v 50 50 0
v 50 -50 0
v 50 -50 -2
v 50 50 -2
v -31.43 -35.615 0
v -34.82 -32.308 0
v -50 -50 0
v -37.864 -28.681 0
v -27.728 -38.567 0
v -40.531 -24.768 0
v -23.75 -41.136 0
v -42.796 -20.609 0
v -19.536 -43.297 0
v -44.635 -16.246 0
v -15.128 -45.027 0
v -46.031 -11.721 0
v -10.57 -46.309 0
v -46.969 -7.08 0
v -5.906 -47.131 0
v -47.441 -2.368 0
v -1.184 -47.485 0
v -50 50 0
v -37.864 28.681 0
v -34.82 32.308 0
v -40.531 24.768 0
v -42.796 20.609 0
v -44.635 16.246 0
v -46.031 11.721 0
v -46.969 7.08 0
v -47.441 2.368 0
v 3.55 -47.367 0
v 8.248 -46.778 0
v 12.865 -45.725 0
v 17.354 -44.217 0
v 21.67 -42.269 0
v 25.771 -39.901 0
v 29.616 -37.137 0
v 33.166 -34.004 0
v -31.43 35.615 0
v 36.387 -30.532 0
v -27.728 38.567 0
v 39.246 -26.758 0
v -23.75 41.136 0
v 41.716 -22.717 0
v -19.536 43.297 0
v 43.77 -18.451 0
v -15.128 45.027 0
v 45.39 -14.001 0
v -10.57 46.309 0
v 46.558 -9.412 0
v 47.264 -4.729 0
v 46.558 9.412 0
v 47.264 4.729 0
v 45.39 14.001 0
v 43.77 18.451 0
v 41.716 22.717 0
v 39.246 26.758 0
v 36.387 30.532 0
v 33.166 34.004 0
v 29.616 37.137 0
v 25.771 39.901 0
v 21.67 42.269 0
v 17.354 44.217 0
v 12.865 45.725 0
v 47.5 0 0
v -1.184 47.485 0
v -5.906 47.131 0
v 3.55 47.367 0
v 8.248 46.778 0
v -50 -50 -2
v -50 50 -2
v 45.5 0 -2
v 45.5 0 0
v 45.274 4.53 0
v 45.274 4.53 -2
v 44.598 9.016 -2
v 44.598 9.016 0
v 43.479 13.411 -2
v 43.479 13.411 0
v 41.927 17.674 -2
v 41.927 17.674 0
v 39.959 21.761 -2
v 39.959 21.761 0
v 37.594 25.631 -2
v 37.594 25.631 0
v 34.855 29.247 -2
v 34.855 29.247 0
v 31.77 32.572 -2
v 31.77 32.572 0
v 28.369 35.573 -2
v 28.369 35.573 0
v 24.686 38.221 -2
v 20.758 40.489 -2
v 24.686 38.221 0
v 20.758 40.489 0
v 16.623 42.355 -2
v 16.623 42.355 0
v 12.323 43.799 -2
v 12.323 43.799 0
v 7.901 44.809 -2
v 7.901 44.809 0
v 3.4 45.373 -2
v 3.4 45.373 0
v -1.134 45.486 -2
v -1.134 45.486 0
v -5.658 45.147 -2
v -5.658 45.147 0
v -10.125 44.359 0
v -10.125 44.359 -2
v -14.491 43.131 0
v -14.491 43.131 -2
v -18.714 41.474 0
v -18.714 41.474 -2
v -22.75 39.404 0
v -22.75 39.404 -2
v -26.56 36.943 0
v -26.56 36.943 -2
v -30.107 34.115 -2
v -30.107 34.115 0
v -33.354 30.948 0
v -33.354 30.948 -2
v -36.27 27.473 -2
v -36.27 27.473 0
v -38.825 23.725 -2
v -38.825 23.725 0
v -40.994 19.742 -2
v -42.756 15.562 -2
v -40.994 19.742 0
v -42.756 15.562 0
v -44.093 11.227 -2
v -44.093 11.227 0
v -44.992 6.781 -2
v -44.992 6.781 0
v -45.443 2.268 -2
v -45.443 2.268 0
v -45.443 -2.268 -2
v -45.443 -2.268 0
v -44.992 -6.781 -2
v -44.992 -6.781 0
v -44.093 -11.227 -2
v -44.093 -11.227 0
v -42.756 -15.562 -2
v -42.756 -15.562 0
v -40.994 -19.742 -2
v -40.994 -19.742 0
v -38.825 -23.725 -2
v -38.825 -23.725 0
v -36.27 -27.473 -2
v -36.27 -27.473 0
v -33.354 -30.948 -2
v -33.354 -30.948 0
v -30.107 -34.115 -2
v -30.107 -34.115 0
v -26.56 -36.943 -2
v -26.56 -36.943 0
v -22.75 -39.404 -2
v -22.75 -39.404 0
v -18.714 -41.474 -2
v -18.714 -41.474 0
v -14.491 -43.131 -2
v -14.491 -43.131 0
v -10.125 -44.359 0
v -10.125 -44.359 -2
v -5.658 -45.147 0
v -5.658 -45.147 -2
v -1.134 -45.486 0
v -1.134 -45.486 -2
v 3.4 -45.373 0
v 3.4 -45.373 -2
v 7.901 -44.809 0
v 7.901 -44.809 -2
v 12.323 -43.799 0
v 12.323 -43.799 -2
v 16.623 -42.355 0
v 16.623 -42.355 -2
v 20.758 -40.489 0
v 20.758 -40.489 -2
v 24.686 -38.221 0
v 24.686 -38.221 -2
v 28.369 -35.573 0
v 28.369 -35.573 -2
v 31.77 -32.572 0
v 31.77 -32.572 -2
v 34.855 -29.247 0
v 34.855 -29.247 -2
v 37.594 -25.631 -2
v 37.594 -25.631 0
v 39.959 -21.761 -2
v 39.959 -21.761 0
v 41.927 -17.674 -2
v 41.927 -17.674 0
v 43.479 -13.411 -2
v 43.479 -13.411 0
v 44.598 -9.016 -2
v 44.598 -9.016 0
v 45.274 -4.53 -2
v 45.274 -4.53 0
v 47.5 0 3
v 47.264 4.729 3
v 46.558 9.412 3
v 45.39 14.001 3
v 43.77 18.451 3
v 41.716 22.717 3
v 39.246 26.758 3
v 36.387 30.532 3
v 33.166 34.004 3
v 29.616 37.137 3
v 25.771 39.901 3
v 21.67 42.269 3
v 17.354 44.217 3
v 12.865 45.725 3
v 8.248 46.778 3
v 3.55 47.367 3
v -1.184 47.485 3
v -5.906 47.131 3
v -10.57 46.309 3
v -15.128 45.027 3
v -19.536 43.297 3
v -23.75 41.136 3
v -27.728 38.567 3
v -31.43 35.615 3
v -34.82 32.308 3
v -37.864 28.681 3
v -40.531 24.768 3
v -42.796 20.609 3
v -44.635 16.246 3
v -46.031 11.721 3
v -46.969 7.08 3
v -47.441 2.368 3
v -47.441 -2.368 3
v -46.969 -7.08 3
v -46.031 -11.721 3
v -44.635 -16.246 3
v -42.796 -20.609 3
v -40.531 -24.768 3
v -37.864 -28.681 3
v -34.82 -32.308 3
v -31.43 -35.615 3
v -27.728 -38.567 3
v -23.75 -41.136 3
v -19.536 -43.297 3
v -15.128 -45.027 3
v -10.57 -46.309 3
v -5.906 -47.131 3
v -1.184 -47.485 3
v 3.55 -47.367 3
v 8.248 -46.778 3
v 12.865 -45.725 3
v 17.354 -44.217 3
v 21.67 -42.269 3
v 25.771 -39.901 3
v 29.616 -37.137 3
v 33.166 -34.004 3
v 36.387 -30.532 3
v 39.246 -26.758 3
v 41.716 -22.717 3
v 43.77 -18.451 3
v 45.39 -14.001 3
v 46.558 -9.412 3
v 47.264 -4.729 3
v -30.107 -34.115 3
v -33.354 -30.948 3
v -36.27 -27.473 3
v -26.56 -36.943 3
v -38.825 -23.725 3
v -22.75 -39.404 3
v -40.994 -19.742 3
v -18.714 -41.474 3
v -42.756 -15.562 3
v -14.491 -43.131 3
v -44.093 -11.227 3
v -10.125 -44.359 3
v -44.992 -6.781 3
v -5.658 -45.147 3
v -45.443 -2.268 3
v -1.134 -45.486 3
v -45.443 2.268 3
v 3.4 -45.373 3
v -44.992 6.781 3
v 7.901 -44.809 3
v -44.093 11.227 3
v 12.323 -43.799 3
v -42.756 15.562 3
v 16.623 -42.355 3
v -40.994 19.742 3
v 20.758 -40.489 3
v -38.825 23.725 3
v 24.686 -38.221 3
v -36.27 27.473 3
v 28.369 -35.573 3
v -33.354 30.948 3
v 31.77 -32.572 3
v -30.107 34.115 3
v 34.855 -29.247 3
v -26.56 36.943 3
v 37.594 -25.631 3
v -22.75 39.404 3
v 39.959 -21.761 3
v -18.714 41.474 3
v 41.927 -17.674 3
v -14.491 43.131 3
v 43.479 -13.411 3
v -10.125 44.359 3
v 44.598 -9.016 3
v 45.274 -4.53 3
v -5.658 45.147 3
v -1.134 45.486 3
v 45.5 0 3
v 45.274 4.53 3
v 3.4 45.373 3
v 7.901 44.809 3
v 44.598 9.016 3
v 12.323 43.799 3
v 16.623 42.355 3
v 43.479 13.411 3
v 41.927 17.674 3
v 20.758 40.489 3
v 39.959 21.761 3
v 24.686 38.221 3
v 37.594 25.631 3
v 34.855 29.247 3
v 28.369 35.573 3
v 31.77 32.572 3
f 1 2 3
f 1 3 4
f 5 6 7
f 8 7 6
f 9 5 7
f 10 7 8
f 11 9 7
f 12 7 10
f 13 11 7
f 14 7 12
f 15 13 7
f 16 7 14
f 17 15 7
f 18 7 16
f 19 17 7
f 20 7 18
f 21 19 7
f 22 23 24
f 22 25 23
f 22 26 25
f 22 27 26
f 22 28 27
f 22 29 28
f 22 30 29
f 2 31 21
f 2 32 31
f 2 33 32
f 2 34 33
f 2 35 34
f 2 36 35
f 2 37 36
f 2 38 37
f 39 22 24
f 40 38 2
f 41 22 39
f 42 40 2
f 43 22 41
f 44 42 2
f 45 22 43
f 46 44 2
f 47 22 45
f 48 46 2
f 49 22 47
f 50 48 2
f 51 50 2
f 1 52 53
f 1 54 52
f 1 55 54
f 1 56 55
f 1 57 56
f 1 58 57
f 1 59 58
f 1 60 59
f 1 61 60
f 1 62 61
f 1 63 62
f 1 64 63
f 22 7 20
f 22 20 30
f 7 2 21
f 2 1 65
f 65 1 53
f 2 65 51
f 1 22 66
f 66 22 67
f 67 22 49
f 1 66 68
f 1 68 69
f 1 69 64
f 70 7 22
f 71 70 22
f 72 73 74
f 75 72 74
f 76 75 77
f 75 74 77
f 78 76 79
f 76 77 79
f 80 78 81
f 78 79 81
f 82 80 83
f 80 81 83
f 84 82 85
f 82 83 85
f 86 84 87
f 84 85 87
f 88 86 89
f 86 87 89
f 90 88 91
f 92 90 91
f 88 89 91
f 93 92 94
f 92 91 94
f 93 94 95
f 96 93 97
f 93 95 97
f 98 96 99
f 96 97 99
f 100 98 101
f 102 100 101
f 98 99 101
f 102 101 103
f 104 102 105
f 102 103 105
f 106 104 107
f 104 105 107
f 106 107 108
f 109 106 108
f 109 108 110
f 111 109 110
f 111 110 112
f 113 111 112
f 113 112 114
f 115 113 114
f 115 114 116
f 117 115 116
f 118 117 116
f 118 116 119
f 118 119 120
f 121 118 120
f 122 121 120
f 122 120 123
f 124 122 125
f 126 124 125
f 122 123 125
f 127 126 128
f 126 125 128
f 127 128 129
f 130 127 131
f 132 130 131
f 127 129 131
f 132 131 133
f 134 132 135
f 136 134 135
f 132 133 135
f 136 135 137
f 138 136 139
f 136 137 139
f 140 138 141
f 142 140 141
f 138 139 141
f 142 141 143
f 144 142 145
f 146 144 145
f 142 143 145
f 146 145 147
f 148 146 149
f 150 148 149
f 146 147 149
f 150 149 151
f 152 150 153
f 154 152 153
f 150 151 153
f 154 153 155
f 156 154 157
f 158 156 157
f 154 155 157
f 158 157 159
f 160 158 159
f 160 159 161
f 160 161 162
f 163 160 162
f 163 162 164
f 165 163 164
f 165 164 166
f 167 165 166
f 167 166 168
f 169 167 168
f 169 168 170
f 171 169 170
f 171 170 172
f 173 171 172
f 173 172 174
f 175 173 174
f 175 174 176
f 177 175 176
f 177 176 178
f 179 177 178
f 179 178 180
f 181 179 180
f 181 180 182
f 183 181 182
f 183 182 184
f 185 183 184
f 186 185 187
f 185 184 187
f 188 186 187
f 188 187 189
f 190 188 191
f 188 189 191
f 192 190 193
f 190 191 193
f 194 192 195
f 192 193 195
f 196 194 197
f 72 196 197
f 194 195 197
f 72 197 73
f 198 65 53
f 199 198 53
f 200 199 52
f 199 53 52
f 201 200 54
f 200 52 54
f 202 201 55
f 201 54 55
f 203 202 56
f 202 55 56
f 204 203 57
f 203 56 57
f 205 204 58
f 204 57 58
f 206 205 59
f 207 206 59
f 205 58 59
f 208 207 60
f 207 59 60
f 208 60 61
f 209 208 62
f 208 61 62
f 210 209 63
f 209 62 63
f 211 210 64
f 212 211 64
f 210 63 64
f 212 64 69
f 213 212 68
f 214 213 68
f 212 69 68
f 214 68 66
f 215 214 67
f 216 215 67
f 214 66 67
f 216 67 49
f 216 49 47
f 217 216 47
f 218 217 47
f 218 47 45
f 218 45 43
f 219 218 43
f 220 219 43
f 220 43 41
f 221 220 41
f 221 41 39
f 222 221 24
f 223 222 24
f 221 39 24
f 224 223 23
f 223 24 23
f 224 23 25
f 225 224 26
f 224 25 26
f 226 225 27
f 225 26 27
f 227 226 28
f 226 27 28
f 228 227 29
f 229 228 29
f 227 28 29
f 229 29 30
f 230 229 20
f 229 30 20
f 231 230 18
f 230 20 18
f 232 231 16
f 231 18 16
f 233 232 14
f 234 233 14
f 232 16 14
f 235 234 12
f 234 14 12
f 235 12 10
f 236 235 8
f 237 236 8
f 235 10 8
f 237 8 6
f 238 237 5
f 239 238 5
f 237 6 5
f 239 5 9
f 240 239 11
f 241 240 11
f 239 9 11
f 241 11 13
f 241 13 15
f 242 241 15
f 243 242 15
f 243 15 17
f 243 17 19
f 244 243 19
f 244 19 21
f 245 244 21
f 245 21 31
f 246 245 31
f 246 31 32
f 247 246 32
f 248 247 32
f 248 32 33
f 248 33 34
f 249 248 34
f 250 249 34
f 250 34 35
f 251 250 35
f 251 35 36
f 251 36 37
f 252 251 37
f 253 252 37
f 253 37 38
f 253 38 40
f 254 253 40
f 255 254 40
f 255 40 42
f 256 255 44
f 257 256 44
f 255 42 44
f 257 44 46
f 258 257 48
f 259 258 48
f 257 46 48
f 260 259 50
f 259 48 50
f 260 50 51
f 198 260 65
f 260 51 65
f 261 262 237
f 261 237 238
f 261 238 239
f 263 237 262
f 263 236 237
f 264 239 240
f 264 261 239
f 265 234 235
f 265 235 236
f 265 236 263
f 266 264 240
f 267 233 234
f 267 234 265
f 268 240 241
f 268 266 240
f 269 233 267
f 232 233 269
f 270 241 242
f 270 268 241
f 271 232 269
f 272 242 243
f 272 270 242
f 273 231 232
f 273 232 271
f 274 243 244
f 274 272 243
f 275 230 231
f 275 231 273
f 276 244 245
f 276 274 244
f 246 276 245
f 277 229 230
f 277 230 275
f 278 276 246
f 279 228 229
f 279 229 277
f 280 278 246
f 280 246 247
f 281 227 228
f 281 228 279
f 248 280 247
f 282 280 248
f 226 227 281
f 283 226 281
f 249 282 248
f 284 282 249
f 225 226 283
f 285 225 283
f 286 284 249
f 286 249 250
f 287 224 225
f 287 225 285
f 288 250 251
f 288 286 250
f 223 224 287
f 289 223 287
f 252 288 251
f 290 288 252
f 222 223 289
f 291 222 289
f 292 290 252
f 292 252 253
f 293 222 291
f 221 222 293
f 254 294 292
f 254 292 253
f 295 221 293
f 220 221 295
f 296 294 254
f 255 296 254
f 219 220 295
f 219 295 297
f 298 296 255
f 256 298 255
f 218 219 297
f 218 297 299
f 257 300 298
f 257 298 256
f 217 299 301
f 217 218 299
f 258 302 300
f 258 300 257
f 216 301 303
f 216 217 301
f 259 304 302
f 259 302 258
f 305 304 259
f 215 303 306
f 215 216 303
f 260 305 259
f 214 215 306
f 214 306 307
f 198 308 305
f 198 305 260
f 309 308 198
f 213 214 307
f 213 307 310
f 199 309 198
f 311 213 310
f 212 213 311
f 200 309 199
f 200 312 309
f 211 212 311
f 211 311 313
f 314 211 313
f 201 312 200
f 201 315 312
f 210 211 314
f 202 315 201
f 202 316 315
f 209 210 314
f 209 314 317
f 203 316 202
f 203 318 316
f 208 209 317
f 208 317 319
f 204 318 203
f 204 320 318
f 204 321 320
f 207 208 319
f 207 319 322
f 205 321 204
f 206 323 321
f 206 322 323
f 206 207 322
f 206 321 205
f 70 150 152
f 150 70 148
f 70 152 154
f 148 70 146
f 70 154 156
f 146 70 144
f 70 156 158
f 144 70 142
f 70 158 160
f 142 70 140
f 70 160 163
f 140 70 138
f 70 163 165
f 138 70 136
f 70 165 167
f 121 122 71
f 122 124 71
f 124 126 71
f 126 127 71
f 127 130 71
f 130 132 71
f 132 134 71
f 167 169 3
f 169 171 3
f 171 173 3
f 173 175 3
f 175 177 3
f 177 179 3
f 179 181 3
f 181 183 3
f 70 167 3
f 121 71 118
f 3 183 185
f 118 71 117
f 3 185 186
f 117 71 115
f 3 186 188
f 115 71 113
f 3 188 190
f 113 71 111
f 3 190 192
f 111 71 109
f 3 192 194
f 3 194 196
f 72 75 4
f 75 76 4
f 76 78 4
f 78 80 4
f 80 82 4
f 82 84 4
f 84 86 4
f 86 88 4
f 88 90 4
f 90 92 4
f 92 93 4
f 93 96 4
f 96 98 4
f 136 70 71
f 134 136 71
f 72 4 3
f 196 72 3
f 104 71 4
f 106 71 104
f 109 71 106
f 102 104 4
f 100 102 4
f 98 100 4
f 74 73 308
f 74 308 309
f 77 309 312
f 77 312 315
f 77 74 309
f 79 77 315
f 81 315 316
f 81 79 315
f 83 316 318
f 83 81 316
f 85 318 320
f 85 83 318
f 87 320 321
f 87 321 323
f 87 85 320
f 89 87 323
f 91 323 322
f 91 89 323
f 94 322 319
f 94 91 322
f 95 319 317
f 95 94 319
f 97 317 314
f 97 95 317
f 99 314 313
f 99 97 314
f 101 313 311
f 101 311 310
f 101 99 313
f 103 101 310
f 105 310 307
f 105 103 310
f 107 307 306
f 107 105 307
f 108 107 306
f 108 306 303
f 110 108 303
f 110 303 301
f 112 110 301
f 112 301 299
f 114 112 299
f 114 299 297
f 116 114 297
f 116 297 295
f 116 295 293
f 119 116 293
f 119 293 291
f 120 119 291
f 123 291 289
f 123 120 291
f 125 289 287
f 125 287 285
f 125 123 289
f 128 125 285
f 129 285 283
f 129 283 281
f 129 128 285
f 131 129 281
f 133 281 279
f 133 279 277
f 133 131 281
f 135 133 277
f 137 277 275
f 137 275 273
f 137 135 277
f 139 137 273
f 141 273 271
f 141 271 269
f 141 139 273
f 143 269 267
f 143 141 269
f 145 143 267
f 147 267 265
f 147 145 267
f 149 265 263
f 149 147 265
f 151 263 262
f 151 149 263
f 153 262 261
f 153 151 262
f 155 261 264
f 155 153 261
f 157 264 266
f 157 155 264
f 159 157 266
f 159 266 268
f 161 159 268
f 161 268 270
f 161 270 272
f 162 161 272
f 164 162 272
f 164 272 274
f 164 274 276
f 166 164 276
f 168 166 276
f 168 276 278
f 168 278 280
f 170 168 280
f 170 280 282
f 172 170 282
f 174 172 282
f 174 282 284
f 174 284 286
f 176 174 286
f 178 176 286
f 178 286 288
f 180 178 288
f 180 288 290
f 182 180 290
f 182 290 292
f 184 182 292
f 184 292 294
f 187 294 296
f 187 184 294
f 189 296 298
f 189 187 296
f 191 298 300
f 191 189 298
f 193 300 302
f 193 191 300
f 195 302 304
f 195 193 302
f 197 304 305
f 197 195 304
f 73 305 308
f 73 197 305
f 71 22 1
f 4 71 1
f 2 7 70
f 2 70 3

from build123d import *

# Parameters (mm, degrees)
F0_R     = 47.5
F0_R_2   = 45.5
F1_DEPTH = 3
F2_W     = 100
F2_H     = 100
F2_R     = 45.5
F3_DEPTH = 2


with BuildPart() as f1:
    # F0 (on Top) → F1 (new body)
    with BuildSketch(Plane.XY):
        Circle(F0_R)
        Circle(F0_R_2, mode=Mode.SUBTRACT)
    extrude(amount=F1_DEPTH)

    # F2 (on Top) → F3 (join)
    with BuildSketch(Plane.XY):
        Rectangle(F2_W, F2_H)
        Circle(F2_R, mode=Mode.SUBTRACT)
    extrude(amount=-F3_DEPTH)


solid = f1.part
